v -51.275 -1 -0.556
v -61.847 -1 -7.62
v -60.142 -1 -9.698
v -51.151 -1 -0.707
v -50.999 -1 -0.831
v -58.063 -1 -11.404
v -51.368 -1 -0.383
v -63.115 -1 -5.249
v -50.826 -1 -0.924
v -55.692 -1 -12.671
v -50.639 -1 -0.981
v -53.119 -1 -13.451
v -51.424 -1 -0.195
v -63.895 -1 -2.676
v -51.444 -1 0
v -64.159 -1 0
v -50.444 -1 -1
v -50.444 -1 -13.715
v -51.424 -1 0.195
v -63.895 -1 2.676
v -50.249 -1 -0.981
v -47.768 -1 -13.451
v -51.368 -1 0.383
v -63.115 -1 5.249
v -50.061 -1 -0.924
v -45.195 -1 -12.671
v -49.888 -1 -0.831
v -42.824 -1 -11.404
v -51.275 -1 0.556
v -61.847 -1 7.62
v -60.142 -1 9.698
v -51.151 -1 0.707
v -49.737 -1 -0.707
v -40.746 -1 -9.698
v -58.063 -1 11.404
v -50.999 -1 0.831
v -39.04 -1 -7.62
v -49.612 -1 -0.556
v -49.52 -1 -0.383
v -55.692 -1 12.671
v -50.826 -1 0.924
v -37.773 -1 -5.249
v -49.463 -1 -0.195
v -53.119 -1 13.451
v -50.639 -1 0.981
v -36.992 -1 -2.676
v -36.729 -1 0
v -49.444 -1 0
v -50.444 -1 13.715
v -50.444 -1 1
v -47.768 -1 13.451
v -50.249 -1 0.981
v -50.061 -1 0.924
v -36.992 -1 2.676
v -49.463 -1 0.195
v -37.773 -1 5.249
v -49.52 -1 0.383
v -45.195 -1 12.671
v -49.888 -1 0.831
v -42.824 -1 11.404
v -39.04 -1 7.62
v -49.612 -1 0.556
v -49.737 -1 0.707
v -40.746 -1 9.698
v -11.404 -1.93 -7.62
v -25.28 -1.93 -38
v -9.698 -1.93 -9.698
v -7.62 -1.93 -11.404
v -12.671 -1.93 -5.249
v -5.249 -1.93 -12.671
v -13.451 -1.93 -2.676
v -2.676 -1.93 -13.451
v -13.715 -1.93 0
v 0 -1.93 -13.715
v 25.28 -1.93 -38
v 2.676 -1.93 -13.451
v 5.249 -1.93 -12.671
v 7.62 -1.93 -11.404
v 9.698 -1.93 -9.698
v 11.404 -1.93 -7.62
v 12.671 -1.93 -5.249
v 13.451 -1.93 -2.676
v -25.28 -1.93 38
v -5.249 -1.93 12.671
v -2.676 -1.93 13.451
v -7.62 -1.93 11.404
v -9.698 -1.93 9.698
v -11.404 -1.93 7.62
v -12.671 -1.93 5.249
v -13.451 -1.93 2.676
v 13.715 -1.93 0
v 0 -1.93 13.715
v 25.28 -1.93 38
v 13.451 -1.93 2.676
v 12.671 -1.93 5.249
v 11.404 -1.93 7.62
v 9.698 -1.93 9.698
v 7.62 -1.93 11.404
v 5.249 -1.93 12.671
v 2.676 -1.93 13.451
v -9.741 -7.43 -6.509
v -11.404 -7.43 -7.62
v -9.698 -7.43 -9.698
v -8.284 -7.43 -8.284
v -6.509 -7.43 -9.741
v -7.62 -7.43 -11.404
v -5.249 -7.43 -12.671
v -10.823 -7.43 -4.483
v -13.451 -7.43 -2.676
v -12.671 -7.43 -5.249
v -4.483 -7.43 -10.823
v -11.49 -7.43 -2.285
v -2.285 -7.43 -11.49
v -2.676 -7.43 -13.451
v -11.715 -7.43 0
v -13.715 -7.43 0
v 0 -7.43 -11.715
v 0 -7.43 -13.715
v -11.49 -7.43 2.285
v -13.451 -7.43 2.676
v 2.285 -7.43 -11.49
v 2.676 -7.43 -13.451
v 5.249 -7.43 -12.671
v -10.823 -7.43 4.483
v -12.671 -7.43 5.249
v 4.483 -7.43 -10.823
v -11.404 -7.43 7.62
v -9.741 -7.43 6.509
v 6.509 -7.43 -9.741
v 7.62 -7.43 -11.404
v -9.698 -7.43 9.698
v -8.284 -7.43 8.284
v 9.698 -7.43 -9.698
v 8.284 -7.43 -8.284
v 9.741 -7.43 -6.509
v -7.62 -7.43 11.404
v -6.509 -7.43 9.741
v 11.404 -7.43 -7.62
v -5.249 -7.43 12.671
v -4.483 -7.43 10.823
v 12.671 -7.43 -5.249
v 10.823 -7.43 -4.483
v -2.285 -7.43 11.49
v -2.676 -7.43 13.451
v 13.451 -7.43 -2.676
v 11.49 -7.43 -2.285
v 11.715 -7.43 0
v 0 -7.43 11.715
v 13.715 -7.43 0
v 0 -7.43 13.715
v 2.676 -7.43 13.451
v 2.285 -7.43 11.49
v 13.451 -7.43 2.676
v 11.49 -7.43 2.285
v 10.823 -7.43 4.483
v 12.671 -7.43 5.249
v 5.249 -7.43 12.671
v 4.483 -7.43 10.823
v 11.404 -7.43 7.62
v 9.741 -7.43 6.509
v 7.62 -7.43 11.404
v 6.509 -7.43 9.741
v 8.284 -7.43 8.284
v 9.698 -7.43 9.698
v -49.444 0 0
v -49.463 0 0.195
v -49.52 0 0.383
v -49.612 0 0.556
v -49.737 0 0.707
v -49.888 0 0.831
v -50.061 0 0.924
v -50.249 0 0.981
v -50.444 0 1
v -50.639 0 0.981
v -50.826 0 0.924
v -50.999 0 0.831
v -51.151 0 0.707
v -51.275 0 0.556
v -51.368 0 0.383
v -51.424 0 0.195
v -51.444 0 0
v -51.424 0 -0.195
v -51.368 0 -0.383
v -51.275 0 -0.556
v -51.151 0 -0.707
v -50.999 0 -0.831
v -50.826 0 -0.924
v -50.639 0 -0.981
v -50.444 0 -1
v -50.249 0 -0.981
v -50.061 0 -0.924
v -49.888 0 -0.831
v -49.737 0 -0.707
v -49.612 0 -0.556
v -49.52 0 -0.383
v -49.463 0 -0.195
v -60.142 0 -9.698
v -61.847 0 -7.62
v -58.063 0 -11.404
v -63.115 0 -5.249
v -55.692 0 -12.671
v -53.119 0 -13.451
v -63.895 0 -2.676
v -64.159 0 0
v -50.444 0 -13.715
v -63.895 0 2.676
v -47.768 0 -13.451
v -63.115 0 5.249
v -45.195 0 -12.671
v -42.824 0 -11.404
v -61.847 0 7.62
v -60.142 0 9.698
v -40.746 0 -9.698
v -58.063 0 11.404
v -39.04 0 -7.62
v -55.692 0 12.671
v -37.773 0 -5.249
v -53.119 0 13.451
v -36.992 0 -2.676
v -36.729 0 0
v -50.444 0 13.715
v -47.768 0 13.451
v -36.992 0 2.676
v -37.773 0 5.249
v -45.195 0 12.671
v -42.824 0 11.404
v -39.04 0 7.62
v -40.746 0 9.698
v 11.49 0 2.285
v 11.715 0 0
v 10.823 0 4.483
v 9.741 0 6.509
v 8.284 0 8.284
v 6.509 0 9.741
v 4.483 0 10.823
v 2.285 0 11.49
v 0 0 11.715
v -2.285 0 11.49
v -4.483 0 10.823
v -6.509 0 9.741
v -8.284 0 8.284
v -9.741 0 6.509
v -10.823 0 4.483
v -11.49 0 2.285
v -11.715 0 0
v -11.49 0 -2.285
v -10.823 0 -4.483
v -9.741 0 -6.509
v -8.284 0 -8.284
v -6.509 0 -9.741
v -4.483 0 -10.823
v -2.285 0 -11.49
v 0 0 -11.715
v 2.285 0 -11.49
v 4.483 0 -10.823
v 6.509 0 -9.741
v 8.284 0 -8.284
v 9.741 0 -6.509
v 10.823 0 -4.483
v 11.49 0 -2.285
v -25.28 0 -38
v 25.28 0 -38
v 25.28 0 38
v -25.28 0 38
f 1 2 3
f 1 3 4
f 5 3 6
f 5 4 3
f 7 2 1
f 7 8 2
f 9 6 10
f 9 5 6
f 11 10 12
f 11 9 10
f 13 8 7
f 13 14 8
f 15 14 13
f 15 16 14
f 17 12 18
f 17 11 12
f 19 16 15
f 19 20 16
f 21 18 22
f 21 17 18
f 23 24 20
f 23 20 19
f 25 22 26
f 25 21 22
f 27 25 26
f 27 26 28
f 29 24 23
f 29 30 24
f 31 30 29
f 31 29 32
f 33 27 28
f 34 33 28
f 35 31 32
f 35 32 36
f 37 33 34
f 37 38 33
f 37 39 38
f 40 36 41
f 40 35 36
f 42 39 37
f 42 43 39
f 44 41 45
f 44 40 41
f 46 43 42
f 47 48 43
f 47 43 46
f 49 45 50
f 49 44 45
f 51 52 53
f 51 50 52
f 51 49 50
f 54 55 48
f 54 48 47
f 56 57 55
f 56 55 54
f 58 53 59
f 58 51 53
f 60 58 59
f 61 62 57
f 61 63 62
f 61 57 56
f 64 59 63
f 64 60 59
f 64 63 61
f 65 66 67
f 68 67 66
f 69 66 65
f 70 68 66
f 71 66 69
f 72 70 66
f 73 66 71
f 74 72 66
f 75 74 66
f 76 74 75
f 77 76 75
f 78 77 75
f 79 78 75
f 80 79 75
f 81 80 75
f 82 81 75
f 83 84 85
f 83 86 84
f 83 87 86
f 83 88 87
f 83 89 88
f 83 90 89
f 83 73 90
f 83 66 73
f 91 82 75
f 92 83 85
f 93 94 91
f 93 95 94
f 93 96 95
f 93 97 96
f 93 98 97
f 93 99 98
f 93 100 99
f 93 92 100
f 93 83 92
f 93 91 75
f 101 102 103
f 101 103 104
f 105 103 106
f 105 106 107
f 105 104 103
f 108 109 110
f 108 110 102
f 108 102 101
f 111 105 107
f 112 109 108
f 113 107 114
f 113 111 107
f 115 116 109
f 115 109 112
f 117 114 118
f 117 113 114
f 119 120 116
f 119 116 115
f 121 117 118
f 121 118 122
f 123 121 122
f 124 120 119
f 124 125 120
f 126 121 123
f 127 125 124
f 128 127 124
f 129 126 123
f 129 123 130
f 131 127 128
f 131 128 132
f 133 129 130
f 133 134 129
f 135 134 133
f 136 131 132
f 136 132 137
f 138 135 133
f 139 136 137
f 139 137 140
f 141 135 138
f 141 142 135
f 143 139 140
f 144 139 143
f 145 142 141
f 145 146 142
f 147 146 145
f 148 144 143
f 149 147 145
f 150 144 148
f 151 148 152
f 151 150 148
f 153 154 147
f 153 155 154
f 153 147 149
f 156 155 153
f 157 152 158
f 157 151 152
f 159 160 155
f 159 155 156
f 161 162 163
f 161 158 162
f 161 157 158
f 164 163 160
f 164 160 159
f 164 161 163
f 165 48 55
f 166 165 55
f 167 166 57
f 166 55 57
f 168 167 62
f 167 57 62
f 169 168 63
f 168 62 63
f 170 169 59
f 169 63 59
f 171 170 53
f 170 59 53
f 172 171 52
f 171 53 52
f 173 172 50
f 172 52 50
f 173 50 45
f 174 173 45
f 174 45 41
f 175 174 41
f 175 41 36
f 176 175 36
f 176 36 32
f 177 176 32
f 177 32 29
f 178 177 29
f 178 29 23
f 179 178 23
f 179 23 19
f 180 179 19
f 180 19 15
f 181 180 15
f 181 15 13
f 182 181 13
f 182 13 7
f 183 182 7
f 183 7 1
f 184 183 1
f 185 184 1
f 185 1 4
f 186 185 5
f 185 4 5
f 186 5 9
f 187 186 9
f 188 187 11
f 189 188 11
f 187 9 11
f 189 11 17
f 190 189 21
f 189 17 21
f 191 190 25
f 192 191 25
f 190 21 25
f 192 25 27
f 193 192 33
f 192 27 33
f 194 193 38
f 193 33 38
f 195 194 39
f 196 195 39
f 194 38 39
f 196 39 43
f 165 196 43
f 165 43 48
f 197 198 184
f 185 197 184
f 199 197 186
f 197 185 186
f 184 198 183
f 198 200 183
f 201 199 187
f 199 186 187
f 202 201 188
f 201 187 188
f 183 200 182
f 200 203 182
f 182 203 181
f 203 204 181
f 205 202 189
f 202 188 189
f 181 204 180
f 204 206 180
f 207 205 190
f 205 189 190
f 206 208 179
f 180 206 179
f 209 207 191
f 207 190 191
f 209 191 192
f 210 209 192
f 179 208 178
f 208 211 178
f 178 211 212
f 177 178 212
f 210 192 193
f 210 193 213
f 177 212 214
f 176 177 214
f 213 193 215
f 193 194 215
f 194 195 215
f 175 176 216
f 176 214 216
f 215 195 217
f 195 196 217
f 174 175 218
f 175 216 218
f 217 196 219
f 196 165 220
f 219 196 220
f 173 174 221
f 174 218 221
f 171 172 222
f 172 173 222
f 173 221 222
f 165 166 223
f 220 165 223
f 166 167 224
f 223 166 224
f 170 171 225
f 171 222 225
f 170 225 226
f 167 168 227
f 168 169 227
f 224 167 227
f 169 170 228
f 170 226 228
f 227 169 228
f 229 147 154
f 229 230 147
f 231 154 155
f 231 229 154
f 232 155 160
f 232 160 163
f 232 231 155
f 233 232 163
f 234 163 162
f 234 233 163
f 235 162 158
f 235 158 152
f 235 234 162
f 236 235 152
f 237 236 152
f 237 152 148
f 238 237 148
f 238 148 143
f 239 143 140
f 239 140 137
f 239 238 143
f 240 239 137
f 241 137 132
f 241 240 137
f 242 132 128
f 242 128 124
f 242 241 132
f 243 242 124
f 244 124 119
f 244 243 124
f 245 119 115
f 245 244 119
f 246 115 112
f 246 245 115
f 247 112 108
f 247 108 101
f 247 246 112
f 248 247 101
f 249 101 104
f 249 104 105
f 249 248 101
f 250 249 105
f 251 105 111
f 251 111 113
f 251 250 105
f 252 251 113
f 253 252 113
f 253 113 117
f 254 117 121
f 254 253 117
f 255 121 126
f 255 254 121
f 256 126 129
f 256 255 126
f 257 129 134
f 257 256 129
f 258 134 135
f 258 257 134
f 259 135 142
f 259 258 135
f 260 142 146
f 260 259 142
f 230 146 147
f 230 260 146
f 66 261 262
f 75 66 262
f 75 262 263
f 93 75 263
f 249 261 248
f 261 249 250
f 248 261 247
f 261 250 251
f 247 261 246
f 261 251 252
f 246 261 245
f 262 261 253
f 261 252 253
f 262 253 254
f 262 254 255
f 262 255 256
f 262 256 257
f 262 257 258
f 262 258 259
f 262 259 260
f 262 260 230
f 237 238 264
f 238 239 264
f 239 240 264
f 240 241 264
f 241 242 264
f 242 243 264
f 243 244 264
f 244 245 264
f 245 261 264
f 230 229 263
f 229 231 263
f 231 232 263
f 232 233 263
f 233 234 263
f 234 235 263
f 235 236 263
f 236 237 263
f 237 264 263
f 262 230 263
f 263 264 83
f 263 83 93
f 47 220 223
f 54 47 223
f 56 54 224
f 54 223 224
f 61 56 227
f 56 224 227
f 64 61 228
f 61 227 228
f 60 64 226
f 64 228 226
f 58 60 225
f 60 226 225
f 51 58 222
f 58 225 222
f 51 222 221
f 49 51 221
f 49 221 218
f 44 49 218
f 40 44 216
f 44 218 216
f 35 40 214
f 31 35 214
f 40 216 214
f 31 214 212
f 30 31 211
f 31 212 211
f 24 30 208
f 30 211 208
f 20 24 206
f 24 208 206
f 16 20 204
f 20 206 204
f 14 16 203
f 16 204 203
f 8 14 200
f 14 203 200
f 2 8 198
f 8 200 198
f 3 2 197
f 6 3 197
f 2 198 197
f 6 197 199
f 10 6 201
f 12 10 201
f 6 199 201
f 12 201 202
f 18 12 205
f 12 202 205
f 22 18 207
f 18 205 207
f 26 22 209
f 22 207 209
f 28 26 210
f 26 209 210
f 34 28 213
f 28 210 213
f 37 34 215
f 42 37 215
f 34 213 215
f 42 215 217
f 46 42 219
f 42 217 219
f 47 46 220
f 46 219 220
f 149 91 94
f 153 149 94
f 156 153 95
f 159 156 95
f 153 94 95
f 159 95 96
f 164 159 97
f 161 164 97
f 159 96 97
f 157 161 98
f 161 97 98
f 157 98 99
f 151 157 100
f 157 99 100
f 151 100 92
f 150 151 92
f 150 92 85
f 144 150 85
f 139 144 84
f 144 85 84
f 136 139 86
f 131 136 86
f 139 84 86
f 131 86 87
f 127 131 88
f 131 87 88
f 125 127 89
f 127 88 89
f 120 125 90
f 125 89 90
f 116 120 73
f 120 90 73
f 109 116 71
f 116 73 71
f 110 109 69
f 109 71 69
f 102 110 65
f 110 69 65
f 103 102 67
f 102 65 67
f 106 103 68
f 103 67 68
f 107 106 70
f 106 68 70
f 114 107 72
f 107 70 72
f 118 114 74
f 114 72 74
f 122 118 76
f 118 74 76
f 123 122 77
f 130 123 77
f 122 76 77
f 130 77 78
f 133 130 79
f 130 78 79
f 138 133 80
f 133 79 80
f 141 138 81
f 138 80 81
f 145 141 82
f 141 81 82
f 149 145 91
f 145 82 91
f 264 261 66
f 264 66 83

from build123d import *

# Parameters (mm, degrees)
F0_W     = 50.56
F0_H     = 76
F1_DEPTH = 1.93
F2_R     = 11.715
F3_DEPTH = 1.93
F4_R     = 13.715
F4_R_2   = 11.715
F5_DEPTH = 5.5
F6_R     = 13.715
F7_DEPTH = 1
F9_D     = 2


with BuildPart() as f1:
    # F0 (on Front) → F1 (new body)
    with BuildSketch(Plane.XZ):
        Rectangle(F0_W, F0_H)
    extrude(amount=F1_DEPTH)

    # F2 (on face) → F3 (cut)
    with BuildSketch(Plane.XZ.offset(1.93)):
        Circle(F2_R)
    extrude(amount=-F3_DEPTH, mode=Mode.SUBTRACT)

    # F4 (on face) → F5 (join)
    with BuildSketch(Plane.XZ.offset(1.93)):
        Circle(F4_R)
        Circle(F4_R_2, mode=Mode.SUBTRACT)
    extrude(amount=F5_DEPTH)


with BuildPart() as f7:
    # F6 (on Front) → F7 (new body)
    with BuildSketch(Plane.XZ):
        with Locations((-50.443648, 0)):
            Circle(F6_R)
    extrude(amount=F7_DEPTH)

    # F9 (through all)
    with Locations(Plane(origin=(0, 0, 0), x_dir=(-1, 0, 0), z_dir=(0, 1, 0))):
        with Locations((50.443648, 0)):
            Hole(F9_D / 2)


solid = Compound([f1.part, f7.part])
